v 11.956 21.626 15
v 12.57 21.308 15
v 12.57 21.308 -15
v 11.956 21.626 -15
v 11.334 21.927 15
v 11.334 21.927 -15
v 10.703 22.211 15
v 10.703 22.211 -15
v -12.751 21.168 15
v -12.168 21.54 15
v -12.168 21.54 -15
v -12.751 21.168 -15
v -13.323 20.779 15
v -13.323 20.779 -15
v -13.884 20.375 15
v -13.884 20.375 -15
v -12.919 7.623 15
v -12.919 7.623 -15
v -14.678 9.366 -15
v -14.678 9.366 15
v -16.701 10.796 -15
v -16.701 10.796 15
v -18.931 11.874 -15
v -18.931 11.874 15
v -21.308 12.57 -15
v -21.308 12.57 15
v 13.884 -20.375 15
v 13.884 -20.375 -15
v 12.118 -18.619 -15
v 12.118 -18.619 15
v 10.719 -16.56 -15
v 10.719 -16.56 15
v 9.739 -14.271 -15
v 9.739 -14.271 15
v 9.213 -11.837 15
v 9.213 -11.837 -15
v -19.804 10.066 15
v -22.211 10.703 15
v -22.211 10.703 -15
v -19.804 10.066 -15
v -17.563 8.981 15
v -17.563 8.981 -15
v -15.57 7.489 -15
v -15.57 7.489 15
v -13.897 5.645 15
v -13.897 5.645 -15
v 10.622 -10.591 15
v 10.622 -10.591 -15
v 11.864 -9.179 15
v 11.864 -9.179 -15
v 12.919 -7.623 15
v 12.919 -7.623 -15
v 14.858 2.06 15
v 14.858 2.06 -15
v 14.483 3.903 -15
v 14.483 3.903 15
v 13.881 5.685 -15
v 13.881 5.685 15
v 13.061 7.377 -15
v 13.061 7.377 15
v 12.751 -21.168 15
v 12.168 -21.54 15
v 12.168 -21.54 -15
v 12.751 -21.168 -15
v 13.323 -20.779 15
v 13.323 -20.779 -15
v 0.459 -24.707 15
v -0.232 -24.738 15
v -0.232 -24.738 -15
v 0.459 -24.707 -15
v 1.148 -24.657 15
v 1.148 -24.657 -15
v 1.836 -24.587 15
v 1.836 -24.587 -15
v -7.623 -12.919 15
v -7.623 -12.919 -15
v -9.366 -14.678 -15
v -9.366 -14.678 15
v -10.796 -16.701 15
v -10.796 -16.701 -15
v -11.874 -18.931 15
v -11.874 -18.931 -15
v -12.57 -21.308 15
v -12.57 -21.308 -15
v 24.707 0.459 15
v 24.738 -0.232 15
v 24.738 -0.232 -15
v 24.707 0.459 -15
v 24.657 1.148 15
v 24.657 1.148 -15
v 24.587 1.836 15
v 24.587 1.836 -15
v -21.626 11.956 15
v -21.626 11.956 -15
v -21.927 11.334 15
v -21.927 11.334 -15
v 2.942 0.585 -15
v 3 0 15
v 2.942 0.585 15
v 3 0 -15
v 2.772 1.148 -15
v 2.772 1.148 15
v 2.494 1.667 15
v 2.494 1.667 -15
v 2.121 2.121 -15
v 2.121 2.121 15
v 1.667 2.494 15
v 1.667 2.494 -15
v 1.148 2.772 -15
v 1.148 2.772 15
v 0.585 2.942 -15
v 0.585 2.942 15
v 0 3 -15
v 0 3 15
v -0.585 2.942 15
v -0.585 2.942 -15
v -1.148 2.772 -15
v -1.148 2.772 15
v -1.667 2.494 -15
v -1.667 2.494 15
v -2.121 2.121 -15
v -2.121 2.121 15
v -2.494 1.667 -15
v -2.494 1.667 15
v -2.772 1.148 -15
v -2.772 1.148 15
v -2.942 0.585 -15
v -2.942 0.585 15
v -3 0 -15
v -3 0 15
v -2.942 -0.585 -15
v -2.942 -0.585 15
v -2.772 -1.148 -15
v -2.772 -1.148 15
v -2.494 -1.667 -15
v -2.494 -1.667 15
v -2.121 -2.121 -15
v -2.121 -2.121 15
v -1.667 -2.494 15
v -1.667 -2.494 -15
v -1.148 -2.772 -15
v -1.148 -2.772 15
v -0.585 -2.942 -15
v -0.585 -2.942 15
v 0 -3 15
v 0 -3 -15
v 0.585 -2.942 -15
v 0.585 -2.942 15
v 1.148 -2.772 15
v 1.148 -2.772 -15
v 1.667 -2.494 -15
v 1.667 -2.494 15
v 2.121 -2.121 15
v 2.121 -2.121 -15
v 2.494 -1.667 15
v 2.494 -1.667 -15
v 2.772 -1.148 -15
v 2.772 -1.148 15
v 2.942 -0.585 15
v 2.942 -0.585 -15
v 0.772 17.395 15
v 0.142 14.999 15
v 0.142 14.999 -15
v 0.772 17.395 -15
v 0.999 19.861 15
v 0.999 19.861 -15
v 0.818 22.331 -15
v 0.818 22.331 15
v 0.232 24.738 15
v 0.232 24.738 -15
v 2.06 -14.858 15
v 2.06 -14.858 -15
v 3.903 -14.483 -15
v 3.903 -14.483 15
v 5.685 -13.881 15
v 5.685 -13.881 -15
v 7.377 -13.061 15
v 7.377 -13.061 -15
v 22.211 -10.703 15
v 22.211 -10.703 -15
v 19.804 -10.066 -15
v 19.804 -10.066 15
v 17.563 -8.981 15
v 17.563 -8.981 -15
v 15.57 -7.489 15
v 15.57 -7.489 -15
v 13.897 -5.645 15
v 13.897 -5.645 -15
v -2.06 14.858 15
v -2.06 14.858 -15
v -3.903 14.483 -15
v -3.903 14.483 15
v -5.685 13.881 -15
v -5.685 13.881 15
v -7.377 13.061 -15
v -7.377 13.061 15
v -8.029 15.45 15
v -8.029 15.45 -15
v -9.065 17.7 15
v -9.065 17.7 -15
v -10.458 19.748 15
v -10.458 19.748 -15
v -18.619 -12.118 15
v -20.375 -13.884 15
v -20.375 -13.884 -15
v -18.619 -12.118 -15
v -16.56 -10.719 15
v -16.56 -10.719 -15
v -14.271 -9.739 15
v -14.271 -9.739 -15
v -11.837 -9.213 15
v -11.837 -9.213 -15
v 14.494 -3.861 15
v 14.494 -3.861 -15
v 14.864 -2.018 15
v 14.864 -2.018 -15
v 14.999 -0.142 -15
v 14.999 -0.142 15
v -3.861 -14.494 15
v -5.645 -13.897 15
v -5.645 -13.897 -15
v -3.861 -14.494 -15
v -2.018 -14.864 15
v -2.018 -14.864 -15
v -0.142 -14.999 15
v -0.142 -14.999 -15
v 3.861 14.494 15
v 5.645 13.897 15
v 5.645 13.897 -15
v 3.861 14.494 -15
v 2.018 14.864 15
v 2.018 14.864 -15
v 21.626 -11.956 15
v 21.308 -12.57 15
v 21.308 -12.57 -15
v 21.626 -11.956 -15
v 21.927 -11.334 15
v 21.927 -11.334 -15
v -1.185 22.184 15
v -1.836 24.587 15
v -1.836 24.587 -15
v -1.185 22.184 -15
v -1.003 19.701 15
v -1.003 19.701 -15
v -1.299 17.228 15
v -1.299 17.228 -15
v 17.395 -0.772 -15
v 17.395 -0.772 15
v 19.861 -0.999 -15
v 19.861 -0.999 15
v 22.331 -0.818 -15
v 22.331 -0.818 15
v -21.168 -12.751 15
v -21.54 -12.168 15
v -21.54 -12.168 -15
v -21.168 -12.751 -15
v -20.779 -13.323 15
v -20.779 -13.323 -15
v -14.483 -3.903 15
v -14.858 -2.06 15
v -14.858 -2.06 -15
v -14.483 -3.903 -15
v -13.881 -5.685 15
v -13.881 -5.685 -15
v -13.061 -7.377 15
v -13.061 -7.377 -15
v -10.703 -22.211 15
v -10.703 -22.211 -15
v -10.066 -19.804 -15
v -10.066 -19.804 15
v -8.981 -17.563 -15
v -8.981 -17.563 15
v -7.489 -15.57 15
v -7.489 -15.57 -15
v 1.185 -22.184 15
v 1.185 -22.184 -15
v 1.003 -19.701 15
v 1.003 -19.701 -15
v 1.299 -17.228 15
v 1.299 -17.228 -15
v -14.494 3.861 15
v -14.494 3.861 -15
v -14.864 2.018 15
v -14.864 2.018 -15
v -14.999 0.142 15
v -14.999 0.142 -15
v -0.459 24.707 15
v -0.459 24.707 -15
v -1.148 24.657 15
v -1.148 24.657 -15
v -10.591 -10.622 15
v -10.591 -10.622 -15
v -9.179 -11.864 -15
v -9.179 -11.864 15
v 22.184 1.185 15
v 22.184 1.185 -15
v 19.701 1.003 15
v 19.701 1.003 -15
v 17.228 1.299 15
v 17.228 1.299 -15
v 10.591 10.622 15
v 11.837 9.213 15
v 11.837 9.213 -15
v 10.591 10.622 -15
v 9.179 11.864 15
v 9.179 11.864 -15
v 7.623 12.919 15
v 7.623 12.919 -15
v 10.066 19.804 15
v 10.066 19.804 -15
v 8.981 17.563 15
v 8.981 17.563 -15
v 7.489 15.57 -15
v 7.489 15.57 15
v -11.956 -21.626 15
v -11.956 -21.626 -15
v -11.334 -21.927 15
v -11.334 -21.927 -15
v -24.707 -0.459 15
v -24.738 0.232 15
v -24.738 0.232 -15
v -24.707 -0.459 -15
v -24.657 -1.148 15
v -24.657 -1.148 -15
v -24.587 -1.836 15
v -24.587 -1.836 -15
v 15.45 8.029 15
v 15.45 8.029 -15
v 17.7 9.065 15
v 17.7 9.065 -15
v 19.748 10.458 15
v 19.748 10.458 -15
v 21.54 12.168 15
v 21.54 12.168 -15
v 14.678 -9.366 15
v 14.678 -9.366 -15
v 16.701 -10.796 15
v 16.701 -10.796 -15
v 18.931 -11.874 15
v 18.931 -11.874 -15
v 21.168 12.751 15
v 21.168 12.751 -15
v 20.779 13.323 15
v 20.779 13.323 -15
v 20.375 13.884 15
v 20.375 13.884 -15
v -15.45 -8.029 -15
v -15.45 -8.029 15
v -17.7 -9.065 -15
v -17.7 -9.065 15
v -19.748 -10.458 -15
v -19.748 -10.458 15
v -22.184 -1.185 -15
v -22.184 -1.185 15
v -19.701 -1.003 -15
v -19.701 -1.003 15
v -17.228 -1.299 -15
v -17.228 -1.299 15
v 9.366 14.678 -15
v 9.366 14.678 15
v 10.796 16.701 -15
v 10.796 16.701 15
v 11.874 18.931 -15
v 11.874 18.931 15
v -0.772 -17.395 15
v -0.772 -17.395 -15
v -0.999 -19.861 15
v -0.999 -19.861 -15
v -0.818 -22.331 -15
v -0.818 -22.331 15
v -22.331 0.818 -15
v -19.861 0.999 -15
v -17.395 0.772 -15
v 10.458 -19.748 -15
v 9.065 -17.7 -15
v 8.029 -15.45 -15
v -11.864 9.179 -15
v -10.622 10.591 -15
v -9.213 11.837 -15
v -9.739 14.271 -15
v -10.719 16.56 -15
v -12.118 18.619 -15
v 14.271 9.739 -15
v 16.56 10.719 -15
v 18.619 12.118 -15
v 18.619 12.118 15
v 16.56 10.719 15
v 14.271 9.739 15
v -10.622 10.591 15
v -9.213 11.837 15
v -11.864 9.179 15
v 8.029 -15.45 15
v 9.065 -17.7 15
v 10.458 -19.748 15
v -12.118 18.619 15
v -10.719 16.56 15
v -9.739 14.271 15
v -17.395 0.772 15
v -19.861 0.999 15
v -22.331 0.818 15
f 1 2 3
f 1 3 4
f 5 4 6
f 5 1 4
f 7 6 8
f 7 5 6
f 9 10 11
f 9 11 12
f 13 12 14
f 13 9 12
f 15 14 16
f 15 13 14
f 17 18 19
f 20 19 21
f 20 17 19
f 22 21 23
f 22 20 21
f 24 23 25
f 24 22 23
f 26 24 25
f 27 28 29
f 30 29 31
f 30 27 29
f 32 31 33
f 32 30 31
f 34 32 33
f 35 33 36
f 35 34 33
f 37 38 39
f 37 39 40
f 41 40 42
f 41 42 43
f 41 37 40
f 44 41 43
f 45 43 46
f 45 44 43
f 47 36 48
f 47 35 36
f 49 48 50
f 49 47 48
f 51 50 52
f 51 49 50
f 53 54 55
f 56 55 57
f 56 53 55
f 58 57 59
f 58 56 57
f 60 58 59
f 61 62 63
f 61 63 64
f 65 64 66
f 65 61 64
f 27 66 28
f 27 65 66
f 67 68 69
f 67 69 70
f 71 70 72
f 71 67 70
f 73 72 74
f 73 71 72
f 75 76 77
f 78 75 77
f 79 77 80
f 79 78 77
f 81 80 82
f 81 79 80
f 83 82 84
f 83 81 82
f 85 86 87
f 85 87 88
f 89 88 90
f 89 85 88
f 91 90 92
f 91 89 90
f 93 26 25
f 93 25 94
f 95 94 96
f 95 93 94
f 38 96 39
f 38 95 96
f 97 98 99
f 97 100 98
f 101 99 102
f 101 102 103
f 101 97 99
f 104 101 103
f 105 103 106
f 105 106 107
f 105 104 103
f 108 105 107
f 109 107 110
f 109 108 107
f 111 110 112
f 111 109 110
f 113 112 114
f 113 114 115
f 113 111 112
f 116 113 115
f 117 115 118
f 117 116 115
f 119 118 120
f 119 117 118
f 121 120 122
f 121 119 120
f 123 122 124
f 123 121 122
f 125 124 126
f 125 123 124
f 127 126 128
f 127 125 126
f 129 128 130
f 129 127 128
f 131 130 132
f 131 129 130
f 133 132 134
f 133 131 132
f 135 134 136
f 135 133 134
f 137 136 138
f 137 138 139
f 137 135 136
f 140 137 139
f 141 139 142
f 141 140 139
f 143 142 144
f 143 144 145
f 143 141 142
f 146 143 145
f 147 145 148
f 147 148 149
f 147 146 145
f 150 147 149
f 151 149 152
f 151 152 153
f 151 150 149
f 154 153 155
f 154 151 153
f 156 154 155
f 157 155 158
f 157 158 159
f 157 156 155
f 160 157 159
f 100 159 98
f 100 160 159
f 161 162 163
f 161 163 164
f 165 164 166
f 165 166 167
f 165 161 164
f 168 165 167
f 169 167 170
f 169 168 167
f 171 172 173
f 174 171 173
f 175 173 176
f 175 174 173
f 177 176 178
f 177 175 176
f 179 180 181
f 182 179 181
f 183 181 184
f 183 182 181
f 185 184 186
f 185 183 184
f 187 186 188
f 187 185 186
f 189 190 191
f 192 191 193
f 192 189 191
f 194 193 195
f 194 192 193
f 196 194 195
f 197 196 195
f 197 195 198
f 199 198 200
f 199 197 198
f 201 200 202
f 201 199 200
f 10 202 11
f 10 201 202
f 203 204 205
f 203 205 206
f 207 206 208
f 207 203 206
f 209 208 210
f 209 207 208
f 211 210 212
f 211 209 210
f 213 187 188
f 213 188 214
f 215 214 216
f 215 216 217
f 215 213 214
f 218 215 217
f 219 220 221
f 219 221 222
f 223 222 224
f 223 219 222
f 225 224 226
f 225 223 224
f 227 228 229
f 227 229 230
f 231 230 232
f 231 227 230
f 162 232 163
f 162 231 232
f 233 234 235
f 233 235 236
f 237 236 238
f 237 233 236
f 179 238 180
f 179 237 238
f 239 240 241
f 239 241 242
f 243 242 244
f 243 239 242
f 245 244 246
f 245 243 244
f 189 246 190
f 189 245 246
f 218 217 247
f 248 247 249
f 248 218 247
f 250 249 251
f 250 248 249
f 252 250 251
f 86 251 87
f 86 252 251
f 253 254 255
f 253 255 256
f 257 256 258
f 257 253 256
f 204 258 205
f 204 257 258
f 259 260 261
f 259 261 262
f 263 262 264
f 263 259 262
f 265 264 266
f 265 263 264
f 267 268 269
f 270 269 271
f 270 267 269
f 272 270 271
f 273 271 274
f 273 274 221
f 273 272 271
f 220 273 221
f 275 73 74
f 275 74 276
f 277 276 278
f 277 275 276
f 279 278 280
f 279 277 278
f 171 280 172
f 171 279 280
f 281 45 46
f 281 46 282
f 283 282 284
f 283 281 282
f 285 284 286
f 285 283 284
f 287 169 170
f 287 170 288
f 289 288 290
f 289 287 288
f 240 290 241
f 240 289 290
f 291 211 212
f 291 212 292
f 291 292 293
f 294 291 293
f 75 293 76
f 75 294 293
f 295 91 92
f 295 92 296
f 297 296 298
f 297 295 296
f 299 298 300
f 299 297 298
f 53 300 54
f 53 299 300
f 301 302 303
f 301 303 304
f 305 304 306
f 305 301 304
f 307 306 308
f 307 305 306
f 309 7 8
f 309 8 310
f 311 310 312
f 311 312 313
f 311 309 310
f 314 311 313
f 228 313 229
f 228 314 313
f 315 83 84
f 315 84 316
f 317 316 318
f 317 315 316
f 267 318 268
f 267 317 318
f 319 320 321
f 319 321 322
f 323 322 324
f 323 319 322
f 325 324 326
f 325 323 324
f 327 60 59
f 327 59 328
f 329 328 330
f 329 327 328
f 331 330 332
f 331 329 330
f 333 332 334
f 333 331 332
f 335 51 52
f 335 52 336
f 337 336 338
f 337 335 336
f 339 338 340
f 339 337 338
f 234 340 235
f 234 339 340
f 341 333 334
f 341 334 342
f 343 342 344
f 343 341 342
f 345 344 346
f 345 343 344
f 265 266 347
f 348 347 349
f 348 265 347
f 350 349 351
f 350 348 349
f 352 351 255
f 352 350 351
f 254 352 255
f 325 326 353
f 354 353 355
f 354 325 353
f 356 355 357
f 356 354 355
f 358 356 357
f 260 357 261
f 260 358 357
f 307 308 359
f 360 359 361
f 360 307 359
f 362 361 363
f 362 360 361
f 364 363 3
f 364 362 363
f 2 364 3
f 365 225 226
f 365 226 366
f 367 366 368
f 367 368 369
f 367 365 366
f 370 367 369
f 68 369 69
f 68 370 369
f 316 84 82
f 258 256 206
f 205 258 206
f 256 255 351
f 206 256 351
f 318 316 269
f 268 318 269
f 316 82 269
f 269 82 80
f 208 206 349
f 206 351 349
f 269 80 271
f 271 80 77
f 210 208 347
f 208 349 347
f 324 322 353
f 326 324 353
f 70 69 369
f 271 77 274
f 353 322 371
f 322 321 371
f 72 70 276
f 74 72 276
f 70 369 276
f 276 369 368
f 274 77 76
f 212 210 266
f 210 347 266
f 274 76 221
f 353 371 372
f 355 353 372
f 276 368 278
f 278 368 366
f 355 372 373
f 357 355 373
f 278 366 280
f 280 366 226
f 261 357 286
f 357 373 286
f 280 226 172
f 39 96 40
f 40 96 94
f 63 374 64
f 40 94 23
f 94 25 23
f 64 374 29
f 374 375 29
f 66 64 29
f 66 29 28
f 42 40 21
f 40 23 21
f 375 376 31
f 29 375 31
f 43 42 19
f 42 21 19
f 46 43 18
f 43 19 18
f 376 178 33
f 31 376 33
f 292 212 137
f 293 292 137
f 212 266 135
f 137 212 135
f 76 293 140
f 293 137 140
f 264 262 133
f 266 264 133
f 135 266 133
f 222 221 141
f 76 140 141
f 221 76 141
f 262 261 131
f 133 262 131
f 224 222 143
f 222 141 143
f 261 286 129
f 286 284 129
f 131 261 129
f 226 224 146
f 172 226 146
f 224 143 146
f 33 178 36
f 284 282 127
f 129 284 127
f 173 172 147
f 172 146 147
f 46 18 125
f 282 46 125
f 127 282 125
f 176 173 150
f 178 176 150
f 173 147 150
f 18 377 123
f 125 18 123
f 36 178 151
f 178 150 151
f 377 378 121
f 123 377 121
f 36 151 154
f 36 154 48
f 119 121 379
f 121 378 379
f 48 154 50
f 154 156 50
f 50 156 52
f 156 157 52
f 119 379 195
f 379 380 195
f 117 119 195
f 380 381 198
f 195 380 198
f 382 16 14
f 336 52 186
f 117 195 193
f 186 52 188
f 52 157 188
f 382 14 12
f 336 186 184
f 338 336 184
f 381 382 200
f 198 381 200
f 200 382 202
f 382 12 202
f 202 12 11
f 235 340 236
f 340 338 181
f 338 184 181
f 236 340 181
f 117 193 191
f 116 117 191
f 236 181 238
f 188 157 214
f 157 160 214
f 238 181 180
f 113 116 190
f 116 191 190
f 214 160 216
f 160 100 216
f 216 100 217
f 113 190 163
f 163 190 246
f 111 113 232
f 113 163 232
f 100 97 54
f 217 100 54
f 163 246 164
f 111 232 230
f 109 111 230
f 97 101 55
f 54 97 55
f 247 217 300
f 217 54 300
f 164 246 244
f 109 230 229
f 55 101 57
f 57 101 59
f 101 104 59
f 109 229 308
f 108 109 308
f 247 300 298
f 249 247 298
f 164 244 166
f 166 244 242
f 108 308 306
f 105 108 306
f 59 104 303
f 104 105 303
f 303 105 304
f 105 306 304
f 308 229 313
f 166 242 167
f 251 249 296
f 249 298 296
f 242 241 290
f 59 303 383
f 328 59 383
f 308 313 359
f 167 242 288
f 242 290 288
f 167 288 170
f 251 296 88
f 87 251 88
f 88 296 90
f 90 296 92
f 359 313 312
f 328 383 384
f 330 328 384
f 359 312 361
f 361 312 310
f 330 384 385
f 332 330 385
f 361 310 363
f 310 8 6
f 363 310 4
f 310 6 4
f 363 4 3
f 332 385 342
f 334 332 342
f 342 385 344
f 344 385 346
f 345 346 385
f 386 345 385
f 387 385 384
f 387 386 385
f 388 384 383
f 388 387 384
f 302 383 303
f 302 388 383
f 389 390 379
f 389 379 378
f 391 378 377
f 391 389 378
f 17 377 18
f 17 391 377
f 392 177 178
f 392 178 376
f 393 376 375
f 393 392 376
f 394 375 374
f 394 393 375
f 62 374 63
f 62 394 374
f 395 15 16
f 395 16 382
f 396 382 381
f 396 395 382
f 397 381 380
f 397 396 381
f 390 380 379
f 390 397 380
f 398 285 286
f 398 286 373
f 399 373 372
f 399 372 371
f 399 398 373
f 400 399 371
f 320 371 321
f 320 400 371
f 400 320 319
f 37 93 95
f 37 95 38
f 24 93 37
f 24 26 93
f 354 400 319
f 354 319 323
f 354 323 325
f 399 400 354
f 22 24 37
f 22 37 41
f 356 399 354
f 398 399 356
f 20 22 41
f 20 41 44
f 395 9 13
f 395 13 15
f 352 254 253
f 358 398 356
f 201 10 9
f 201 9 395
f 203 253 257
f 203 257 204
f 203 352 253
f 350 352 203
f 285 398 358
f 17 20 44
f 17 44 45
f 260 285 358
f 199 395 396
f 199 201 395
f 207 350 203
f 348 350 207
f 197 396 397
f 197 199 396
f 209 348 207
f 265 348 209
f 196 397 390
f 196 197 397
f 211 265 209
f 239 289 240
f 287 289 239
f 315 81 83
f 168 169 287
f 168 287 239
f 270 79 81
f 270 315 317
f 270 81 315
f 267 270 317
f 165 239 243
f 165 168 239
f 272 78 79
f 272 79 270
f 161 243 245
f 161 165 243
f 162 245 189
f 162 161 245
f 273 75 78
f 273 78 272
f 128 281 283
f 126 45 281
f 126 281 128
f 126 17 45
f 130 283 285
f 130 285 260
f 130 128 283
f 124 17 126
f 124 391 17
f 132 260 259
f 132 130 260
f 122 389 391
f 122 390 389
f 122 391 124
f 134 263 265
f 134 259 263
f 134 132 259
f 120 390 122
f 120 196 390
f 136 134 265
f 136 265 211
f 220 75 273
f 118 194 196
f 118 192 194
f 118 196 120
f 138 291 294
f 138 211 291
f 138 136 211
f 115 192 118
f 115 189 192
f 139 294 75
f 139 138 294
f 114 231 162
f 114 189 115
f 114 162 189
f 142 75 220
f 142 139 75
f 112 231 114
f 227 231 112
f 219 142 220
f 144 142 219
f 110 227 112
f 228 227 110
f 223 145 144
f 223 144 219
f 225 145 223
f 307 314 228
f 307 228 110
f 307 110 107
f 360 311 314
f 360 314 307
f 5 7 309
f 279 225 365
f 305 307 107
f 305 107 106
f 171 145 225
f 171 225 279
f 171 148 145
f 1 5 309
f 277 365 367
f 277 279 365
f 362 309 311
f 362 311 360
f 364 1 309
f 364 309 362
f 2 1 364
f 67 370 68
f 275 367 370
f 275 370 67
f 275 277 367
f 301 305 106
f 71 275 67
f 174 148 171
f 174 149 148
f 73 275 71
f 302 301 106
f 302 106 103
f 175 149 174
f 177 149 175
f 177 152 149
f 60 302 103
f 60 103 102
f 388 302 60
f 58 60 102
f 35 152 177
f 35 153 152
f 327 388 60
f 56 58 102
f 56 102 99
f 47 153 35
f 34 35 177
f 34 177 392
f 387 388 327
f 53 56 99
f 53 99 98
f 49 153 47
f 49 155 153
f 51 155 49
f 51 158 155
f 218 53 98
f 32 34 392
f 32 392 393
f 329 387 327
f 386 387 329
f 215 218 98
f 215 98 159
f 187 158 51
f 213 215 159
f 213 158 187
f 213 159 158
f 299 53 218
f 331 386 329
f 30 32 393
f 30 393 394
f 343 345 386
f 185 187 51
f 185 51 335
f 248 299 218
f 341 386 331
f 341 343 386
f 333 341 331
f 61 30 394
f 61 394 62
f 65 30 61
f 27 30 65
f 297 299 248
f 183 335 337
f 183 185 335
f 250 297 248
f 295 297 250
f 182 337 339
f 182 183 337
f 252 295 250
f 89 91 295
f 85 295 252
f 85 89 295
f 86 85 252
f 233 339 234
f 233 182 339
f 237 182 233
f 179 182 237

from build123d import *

# Parameters (mm, degrees)
BOSS_EXTRUDE1_DEPTH = 15
SKETCH6_R           = 15
SKETCH6_R_2         = 3
BOSS_EXTRUDE3_DEPTH = 15
CIRPATTERN3_COUNT   = 12


with BuildPart() as part:
    # Sketch1 → Boss-Extrude1 (new body, symmetric)
    with BuildSketch(Plane.XY):
        with BuildLine():
            Line((3, -13.07179677), (3, -9.801960973))
            ThreePointArc((3, -9.801960973), (-0.660686187, -16.827574978), (-0.232026419, -24.738082314))
            ThreePointArc((-0.232026419, -24.738082314), (0.803634844, -24.68419335), (1.8361294, -24.58696545))
            ThreePointArc((1.8361294, -24.58696545), (1.065897684, -18.692713773), (3, -13.07179677))
        make_face()
    boss_extrude1 = extrude(amount=BOSS_EXTRUDE1_DEPTH, both=True)

    # Sketch6 → Boss-Extrude3 (add, symmetric)
    with BuildSketch(Plane.XY):
        Circle(SKETCH6_R)
        Circle(SKETCH6_R_2, mode=Mode.SUBTRACT)
    extrude(amount=BOSS_EXTRUDE3_DEPTH, both=True)

    # CirPattern3: Boss-Extrude1 ×12 about axis
    cirpattern3_axis = Axis((0, 0, 0), (0, 0, 1))
    for i in range(1, CIRPATTERN3_COUNT):
        add(boss_extrude1.rotate(cirpattern3_axis, i * 360 / CIRPATTERN3_COUNT))


solid = part.part
